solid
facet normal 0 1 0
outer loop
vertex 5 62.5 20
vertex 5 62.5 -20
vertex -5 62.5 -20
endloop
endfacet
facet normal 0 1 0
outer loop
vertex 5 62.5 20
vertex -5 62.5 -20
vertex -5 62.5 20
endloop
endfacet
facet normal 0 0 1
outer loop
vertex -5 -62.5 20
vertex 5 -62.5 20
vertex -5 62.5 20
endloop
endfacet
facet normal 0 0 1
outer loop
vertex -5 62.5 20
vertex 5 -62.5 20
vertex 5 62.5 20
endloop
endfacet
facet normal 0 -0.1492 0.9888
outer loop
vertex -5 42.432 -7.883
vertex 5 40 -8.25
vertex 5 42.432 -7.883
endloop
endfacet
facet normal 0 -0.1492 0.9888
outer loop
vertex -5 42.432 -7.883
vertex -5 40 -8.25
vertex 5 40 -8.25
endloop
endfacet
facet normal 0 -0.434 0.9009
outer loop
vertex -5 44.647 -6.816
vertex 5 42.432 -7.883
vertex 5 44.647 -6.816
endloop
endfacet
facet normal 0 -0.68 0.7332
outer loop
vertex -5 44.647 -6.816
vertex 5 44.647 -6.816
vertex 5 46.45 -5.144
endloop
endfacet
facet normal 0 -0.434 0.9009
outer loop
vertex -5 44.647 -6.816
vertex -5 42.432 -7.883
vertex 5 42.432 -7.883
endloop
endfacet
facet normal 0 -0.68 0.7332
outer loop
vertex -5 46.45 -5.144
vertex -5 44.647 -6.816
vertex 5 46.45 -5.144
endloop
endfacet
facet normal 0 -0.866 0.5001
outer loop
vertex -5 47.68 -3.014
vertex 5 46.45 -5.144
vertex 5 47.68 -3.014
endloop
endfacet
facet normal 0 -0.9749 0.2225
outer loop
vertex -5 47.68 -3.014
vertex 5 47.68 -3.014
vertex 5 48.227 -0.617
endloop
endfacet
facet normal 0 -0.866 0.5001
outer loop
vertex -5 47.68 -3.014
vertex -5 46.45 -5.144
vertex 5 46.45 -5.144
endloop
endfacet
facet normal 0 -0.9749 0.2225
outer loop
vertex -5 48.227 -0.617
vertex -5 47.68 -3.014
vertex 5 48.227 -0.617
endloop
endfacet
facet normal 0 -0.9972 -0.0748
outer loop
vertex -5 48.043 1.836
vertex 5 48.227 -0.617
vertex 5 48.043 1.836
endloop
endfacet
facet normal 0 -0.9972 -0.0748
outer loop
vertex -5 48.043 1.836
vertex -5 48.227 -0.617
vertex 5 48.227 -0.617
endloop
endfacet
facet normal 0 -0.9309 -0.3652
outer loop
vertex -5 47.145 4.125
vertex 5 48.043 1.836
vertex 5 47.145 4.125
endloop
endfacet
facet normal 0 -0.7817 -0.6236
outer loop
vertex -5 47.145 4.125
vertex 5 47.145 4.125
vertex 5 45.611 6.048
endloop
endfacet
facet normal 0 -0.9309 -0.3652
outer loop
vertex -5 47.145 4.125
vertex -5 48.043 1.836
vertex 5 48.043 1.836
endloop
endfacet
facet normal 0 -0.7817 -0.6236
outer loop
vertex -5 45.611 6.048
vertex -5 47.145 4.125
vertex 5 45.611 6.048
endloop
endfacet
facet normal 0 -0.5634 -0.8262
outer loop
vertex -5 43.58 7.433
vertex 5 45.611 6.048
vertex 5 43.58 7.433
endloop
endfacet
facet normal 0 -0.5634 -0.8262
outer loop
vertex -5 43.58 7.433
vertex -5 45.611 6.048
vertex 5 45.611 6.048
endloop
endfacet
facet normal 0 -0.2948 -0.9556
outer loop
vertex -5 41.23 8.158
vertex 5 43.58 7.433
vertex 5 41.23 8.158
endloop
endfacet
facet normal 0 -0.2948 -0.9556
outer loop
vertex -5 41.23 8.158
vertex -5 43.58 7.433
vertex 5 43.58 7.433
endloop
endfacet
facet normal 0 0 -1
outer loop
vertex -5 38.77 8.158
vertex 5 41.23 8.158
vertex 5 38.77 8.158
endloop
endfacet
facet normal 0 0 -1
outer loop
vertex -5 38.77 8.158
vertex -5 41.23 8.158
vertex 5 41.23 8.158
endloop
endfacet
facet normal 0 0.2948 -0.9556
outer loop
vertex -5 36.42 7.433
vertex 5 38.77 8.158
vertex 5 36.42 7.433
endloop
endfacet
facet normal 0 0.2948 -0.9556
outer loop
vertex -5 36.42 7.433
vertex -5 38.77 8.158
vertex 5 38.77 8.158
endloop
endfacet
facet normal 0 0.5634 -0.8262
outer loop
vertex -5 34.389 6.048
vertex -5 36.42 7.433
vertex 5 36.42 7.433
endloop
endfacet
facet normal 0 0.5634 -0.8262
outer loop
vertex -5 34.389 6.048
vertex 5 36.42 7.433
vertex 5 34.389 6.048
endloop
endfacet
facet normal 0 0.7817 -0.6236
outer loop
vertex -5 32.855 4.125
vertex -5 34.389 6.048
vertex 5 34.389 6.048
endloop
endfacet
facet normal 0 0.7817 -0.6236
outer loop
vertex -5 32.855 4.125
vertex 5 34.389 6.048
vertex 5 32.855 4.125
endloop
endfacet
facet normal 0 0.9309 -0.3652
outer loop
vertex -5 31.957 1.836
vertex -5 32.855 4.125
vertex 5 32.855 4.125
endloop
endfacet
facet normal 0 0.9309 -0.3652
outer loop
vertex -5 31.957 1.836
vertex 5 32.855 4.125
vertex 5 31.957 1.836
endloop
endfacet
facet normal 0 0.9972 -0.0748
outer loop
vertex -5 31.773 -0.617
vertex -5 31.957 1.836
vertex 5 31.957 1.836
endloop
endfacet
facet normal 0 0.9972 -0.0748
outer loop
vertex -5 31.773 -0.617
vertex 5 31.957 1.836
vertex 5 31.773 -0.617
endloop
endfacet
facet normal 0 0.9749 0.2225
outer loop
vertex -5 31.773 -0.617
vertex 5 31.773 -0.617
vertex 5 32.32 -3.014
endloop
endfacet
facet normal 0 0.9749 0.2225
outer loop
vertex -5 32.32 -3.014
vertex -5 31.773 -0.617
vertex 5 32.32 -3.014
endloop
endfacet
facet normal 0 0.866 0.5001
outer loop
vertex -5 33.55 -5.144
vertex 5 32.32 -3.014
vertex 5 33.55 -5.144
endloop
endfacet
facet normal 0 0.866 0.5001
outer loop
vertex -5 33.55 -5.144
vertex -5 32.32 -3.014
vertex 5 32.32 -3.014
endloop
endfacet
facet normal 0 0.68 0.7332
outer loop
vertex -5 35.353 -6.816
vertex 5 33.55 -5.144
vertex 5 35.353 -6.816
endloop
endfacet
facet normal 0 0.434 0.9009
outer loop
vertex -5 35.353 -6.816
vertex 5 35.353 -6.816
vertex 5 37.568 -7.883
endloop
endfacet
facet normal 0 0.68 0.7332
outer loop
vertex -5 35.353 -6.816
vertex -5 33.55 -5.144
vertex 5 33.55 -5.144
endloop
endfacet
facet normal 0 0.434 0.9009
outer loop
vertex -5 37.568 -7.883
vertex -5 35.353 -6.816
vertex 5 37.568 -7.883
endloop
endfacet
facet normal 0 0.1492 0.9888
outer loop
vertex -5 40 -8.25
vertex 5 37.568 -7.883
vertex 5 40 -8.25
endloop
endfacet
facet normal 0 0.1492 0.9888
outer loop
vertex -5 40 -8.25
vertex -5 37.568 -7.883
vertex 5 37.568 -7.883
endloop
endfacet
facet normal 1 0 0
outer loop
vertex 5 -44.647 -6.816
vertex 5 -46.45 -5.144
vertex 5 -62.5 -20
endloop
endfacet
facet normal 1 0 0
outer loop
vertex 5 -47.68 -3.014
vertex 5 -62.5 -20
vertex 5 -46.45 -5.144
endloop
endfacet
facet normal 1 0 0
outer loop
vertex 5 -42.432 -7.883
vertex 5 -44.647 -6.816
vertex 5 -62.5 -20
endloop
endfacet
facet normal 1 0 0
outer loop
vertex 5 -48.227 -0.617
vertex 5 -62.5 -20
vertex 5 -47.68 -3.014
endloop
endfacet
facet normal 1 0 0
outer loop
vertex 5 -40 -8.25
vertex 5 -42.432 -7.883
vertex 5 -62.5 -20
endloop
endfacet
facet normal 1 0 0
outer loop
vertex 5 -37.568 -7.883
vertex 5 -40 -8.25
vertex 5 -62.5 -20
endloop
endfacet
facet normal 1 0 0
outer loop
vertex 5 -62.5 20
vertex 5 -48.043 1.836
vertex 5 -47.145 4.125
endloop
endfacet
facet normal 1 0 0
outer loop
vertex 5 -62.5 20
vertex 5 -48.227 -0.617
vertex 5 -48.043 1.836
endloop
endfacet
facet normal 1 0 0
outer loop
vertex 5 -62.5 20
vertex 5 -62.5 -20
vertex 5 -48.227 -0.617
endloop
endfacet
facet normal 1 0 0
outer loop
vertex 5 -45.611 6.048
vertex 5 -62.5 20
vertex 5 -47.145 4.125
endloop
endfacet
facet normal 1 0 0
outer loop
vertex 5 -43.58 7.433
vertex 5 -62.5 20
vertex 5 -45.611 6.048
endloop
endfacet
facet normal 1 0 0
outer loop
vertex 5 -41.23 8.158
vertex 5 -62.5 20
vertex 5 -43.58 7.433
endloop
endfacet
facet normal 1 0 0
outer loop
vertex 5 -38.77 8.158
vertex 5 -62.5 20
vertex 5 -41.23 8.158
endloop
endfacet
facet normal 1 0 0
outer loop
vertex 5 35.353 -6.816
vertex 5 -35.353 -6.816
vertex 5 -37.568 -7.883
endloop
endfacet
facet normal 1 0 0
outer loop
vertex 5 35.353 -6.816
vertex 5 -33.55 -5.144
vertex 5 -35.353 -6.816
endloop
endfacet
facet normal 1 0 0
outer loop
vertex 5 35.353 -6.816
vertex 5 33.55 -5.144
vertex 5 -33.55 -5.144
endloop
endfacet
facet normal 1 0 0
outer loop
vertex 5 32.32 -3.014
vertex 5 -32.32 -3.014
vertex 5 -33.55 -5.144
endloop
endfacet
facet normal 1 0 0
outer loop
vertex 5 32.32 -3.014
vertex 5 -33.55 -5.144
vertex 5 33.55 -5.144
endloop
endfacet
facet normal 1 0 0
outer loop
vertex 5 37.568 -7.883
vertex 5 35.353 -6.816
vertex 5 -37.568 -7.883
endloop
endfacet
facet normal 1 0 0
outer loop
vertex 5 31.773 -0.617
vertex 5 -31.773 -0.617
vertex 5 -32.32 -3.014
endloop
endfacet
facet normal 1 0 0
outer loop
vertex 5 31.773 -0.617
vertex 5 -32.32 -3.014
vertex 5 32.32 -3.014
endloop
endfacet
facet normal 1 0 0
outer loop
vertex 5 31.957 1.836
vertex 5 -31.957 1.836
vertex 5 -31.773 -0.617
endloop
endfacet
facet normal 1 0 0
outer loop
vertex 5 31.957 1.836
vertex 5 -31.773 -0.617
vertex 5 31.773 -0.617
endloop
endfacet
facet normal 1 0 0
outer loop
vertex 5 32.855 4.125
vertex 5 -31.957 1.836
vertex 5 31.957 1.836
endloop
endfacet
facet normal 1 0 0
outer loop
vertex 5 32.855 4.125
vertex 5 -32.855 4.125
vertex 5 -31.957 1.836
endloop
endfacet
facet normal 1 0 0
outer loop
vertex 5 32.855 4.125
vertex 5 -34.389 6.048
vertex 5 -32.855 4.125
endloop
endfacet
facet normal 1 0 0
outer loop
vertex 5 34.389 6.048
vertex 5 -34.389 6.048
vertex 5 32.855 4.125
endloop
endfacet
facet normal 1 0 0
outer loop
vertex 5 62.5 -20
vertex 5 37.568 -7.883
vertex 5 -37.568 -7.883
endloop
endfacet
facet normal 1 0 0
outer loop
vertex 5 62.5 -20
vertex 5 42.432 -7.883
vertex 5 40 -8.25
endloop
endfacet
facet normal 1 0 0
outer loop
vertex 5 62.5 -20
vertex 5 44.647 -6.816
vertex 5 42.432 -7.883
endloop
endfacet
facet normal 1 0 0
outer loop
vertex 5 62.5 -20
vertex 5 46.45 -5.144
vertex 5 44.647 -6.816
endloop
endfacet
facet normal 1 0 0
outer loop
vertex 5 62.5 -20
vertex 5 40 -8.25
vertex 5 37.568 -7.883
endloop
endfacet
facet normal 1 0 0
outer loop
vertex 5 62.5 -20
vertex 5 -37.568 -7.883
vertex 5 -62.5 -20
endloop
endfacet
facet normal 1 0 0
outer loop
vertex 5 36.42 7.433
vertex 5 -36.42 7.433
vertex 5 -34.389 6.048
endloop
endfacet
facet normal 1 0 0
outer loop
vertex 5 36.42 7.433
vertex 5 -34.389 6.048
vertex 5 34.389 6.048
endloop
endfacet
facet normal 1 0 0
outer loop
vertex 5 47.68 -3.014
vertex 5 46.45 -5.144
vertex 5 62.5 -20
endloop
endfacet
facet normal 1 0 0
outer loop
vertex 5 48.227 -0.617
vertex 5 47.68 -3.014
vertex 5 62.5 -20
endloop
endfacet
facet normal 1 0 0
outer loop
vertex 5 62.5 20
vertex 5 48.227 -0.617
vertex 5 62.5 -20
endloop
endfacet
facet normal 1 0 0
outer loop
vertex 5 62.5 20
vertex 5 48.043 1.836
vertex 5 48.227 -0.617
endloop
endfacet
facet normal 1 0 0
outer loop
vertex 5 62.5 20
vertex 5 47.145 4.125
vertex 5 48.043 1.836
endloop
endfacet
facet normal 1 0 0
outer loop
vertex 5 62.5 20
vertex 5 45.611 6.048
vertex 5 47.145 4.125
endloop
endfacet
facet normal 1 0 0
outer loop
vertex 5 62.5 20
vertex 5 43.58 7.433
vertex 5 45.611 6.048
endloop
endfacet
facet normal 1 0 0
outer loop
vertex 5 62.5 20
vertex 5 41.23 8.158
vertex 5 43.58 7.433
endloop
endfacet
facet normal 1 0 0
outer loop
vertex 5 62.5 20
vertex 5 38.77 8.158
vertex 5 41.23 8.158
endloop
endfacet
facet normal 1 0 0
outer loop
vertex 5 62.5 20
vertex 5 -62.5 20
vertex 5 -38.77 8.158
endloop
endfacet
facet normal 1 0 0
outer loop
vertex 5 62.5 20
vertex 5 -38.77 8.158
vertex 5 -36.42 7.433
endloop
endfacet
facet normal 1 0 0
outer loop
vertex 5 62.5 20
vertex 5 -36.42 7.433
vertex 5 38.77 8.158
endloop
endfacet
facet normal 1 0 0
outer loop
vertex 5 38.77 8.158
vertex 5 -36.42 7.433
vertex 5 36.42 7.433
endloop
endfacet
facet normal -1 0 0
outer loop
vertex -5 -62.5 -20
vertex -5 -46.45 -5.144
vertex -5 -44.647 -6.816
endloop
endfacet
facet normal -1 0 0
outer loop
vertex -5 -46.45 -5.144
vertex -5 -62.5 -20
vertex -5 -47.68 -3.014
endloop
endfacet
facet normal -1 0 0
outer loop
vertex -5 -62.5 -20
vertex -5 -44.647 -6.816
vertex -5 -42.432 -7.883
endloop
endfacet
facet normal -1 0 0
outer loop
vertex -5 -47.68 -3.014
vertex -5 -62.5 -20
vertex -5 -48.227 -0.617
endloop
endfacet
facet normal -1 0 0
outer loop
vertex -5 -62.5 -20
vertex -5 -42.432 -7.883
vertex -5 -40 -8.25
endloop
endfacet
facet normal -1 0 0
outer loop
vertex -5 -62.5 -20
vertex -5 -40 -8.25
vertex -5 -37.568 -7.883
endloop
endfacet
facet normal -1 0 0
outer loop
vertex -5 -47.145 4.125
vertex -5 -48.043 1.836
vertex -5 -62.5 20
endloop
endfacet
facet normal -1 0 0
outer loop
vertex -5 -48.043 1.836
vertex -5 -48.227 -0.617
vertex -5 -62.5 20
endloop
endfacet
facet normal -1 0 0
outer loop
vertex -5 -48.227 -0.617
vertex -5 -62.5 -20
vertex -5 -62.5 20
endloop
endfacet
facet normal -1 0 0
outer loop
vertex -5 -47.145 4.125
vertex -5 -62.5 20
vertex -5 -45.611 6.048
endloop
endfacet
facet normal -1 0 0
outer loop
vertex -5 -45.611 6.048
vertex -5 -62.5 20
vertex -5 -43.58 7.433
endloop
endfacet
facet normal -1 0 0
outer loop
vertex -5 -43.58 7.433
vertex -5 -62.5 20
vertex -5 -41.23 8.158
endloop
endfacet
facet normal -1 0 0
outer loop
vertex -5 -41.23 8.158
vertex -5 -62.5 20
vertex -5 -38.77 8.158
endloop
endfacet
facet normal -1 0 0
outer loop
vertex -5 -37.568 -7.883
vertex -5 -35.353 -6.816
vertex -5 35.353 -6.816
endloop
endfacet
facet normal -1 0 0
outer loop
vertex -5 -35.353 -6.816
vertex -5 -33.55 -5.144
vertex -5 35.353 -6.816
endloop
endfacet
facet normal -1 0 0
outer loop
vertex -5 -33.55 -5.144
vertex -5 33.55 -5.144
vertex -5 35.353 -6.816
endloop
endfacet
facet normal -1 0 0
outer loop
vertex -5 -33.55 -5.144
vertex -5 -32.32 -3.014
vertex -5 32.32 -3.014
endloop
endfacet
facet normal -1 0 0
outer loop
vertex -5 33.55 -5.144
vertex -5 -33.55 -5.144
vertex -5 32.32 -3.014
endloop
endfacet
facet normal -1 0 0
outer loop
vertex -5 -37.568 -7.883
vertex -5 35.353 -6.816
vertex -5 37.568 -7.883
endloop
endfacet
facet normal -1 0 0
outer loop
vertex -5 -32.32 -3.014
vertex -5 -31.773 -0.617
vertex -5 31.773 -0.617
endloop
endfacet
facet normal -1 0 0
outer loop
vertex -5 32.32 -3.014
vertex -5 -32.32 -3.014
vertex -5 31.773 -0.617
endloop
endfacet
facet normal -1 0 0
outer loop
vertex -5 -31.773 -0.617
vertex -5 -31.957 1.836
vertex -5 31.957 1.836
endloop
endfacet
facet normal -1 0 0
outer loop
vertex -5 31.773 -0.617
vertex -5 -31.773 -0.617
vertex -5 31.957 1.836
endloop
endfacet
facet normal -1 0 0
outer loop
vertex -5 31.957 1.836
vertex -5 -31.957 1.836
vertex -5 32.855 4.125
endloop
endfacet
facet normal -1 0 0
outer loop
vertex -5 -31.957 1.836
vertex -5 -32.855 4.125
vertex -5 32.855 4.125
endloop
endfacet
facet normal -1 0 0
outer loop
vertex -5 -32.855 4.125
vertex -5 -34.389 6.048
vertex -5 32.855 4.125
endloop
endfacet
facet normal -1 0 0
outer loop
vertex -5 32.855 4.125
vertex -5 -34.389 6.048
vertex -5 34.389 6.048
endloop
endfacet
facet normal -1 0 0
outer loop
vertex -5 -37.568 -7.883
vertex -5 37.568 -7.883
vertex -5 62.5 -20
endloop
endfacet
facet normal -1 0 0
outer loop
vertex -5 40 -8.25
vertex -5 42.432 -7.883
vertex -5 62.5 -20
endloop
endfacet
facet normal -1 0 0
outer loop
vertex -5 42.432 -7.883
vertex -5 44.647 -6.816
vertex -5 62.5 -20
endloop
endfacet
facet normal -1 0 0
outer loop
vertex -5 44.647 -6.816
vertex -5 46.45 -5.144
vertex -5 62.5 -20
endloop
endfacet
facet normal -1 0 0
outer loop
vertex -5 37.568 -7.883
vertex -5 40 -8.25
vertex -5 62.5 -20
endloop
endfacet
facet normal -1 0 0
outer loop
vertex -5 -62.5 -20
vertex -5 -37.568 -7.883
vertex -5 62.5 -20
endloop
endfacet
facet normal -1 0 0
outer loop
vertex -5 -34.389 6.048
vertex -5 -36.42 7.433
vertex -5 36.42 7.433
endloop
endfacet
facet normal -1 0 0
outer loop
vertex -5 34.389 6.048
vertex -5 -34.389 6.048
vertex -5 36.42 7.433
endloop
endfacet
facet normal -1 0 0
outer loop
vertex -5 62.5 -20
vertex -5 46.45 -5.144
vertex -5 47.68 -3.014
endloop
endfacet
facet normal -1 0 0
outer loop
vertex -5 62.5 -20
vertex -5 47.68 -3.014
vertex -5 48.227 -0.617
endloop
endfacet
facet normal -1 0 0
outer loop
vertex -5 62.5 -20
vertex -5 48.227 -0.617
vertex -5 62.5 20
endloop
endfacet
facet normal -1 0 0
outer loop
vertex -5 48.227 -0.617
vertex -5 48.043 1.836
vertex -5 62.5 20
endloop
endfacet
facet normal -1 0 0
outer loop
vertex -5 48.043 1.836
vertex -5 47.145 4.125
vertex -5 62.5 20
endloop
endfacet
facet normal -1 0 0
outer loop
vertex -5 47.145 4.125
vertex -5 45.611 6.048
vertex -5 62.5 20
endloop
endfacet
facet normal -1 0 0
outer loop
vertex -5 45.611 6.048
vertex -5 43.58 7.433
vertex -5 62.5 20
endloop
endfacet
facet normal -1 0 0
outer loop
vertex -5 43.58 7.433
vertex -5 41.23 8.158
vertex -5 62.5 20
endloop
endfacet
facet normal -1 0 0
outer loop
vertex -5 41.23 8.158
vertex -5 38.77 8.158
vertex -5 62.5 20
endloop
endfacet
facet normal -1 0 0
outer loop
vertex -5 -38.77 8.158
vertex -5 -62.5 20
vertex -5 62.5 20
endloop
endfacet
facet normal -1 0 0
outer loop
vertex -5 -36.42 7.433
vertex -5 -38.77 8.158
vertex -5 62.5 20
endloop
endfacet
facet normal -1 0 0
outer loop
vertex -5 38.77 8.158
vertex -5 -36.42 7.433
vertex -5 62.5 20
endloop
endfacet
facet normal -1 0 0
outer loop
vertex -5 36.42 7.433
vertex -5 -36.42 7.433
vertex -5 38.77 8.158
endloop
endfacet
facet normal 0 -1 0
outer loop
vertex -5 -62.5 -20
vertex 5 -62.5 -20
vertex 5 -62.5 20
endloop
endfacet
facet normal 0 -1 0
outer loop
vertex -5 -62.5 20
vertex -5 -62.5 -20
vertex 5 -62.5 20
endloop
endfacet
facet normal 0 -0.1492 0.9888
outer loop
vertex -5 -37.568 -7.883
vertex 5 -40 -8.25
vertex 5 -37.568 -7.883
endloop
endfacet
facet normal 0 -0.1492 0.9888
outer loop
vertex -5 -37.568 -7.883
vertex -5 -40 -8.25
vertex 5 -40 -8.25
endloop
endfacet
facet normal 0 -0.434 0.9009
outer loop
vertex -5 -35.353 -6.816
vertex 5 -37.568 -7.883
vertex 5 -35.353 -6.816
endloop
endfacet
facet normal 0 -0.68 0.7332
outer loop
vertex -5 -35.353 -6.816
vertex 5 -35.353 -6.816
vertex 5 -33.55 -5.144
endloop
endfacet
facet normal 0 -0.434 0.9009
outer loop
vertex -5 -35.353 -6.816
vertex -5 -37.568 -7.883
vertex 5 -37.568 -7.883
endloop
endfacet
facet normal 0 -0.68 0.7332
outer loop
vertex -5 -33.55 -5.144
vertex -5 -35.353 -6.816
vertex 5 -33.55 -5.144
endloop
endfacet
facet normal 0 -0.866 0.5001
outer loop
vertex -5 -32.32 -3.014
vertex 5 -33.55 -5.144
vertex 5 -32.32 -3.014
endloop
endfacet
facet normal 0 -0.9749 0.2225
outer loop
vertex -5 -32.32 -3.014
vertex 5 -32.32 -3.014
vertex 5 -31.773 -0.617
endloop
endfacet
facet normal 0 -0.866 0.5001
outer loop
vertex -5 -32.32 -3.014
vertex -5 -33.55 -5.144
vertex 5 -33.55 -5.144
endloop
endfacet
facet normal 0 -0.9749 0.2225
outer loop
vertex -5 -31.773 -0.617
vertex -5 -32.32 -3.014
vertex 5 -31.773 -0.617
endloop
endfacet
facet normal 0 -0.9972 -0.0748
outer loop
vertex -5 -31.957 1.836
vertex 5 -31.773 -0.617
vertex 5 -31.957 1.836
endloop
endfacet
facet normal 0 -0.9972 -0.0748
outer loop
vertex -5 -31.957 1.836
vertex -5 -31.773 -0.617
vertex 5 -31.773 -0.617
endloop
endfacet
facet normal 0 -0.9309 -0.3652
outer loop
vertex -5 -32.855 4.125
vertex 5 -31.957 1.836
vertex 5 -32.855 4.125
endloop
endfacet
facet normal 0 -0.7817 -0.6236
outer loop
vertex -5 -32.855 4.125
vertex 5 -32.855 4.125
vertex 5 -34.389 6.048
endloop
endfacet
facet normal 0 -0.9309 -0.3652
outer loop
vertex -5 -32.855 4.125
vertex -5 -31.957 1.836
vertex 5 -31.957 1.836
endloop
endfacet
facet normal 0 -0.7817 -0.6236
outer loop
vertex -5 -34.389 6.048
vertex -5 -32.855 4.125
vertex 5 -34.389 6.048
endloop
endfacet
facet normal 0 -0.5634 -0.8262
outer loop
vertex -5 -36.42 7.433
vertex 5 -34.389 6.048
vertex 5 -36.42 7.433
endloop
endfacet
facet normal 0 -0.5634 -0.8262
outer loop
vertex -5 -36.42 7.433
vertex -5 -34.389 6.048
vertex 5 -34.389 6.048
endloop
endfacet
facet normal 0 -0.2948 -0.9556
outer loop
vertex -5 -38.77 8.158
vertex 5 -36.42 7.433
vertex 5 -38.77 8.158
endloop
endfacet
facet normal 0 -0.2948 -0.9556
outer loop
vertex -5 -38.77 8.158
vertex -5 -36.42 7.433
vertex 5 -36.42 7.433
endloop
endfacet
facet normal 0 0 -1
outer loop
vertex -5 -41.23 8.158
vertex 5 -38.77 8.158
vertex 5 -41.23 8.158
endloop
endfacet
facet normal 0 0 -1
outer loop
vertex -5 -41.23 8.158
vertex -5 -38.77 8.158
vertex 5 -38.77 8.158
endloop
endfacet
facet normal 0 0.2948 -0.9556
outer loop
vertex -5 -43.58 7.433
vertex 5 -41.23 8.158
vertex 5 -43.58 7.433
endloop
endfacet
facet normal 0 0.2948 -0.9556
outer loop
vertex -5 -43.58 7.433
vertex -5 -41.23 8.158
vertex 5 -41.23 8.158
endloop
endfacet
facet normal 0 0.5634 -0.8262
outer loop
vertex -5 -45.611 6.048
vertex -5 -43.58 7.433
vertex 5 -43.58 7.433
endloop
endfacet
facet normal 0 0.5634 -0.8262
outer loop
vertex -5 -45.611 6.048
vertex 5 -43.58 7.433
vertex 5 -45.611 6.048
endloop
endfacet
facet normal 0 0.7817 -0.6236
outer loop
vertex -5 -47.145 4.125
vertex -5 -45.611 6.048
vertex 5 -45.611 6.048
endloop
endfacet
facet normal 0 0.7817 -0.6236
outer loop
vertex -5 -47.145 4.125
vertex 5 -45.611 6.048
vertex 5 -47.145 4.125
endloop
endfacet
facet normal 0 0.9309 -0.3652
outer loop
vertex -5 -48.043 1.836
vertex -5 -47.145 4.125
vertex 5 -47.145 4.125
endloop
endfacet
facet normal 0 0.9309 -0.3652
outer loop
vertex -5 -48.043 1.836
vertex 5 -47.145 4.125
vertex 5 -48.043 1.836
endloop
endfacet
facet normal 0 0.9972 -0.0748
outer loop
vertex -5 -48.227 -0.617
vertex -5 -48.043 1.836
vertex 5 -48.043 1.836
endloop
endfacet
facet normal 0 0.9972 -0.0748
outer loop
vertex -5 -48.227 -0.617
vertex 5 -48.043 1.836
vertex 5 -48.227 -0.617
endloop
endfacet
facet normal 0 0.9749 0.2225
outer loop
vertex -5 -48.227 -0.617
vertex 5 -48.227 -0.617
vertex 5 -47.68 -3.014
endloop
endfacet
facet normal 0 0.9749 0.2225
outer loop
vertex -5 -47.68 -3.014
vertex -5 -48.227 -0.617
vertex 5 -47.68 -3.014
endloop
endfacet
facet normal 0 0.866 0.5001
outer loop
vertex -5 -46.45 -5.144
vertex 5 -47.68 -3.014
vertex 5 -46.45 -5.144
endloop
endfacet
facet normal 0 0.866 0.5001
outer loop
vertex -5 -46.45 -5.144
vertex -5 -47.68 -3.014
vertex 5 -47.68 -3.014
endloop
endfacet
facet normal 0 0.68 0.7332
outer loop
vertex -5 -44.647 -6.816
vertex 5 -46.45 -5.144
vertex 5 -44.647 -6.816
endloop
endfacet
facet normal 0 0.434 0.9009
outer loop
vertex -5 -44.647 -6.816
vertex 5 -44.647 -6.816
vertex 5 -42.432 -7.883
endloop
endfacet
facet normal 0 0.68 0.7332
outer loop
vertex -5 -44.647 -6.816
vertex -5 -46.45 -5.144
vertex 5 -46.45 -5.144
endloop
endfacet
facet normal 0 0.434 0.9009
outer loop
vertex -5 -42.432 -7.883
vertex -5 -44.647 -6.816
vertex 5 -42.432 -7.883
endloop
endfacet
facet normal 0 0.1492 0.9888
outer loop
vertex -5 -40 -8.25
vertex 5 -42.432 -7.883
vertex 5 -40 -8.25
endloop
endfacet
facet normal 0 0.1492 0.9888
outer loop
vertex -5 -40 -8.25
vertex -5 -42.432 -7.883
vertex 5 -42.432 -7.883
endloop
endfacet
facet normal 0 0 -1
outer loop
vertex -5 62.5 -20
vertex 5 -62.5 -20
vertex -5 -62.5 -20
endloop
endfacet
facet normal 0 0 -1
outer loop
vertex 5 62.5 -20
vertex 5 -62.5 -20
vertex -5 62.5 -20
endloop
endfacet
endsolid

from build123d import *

# Parameters (mm, degrees)
SKETCH1_W           = 125
SKETCH1_H           = 40
SKETCH1_R           = 8.25
BOSS_EXTRUDE1_DEPTH = 5


with BuildPart() as part:
    # Sketch1 → Boss-Extrude1 (new, symmetric)
    with BuildSketch(Plane.YZ):
        Rectangle(SKETCH1_W, SKETCH1_H)
        with Locations(Location((-40, 0, 0), (0, 0, 270))):
            Circle(SKETCH1_R, mode=Mode.SUBTRACT)
        with Locations(Location((40, 0, 0), (0, 0, 270))):
            Circle(SKETCH1_R, mode=Mode.SUBTRACT)
    extrude(amount=BOSS_EXTRUDE1_DEPTH, both=True)


solid = part.part
